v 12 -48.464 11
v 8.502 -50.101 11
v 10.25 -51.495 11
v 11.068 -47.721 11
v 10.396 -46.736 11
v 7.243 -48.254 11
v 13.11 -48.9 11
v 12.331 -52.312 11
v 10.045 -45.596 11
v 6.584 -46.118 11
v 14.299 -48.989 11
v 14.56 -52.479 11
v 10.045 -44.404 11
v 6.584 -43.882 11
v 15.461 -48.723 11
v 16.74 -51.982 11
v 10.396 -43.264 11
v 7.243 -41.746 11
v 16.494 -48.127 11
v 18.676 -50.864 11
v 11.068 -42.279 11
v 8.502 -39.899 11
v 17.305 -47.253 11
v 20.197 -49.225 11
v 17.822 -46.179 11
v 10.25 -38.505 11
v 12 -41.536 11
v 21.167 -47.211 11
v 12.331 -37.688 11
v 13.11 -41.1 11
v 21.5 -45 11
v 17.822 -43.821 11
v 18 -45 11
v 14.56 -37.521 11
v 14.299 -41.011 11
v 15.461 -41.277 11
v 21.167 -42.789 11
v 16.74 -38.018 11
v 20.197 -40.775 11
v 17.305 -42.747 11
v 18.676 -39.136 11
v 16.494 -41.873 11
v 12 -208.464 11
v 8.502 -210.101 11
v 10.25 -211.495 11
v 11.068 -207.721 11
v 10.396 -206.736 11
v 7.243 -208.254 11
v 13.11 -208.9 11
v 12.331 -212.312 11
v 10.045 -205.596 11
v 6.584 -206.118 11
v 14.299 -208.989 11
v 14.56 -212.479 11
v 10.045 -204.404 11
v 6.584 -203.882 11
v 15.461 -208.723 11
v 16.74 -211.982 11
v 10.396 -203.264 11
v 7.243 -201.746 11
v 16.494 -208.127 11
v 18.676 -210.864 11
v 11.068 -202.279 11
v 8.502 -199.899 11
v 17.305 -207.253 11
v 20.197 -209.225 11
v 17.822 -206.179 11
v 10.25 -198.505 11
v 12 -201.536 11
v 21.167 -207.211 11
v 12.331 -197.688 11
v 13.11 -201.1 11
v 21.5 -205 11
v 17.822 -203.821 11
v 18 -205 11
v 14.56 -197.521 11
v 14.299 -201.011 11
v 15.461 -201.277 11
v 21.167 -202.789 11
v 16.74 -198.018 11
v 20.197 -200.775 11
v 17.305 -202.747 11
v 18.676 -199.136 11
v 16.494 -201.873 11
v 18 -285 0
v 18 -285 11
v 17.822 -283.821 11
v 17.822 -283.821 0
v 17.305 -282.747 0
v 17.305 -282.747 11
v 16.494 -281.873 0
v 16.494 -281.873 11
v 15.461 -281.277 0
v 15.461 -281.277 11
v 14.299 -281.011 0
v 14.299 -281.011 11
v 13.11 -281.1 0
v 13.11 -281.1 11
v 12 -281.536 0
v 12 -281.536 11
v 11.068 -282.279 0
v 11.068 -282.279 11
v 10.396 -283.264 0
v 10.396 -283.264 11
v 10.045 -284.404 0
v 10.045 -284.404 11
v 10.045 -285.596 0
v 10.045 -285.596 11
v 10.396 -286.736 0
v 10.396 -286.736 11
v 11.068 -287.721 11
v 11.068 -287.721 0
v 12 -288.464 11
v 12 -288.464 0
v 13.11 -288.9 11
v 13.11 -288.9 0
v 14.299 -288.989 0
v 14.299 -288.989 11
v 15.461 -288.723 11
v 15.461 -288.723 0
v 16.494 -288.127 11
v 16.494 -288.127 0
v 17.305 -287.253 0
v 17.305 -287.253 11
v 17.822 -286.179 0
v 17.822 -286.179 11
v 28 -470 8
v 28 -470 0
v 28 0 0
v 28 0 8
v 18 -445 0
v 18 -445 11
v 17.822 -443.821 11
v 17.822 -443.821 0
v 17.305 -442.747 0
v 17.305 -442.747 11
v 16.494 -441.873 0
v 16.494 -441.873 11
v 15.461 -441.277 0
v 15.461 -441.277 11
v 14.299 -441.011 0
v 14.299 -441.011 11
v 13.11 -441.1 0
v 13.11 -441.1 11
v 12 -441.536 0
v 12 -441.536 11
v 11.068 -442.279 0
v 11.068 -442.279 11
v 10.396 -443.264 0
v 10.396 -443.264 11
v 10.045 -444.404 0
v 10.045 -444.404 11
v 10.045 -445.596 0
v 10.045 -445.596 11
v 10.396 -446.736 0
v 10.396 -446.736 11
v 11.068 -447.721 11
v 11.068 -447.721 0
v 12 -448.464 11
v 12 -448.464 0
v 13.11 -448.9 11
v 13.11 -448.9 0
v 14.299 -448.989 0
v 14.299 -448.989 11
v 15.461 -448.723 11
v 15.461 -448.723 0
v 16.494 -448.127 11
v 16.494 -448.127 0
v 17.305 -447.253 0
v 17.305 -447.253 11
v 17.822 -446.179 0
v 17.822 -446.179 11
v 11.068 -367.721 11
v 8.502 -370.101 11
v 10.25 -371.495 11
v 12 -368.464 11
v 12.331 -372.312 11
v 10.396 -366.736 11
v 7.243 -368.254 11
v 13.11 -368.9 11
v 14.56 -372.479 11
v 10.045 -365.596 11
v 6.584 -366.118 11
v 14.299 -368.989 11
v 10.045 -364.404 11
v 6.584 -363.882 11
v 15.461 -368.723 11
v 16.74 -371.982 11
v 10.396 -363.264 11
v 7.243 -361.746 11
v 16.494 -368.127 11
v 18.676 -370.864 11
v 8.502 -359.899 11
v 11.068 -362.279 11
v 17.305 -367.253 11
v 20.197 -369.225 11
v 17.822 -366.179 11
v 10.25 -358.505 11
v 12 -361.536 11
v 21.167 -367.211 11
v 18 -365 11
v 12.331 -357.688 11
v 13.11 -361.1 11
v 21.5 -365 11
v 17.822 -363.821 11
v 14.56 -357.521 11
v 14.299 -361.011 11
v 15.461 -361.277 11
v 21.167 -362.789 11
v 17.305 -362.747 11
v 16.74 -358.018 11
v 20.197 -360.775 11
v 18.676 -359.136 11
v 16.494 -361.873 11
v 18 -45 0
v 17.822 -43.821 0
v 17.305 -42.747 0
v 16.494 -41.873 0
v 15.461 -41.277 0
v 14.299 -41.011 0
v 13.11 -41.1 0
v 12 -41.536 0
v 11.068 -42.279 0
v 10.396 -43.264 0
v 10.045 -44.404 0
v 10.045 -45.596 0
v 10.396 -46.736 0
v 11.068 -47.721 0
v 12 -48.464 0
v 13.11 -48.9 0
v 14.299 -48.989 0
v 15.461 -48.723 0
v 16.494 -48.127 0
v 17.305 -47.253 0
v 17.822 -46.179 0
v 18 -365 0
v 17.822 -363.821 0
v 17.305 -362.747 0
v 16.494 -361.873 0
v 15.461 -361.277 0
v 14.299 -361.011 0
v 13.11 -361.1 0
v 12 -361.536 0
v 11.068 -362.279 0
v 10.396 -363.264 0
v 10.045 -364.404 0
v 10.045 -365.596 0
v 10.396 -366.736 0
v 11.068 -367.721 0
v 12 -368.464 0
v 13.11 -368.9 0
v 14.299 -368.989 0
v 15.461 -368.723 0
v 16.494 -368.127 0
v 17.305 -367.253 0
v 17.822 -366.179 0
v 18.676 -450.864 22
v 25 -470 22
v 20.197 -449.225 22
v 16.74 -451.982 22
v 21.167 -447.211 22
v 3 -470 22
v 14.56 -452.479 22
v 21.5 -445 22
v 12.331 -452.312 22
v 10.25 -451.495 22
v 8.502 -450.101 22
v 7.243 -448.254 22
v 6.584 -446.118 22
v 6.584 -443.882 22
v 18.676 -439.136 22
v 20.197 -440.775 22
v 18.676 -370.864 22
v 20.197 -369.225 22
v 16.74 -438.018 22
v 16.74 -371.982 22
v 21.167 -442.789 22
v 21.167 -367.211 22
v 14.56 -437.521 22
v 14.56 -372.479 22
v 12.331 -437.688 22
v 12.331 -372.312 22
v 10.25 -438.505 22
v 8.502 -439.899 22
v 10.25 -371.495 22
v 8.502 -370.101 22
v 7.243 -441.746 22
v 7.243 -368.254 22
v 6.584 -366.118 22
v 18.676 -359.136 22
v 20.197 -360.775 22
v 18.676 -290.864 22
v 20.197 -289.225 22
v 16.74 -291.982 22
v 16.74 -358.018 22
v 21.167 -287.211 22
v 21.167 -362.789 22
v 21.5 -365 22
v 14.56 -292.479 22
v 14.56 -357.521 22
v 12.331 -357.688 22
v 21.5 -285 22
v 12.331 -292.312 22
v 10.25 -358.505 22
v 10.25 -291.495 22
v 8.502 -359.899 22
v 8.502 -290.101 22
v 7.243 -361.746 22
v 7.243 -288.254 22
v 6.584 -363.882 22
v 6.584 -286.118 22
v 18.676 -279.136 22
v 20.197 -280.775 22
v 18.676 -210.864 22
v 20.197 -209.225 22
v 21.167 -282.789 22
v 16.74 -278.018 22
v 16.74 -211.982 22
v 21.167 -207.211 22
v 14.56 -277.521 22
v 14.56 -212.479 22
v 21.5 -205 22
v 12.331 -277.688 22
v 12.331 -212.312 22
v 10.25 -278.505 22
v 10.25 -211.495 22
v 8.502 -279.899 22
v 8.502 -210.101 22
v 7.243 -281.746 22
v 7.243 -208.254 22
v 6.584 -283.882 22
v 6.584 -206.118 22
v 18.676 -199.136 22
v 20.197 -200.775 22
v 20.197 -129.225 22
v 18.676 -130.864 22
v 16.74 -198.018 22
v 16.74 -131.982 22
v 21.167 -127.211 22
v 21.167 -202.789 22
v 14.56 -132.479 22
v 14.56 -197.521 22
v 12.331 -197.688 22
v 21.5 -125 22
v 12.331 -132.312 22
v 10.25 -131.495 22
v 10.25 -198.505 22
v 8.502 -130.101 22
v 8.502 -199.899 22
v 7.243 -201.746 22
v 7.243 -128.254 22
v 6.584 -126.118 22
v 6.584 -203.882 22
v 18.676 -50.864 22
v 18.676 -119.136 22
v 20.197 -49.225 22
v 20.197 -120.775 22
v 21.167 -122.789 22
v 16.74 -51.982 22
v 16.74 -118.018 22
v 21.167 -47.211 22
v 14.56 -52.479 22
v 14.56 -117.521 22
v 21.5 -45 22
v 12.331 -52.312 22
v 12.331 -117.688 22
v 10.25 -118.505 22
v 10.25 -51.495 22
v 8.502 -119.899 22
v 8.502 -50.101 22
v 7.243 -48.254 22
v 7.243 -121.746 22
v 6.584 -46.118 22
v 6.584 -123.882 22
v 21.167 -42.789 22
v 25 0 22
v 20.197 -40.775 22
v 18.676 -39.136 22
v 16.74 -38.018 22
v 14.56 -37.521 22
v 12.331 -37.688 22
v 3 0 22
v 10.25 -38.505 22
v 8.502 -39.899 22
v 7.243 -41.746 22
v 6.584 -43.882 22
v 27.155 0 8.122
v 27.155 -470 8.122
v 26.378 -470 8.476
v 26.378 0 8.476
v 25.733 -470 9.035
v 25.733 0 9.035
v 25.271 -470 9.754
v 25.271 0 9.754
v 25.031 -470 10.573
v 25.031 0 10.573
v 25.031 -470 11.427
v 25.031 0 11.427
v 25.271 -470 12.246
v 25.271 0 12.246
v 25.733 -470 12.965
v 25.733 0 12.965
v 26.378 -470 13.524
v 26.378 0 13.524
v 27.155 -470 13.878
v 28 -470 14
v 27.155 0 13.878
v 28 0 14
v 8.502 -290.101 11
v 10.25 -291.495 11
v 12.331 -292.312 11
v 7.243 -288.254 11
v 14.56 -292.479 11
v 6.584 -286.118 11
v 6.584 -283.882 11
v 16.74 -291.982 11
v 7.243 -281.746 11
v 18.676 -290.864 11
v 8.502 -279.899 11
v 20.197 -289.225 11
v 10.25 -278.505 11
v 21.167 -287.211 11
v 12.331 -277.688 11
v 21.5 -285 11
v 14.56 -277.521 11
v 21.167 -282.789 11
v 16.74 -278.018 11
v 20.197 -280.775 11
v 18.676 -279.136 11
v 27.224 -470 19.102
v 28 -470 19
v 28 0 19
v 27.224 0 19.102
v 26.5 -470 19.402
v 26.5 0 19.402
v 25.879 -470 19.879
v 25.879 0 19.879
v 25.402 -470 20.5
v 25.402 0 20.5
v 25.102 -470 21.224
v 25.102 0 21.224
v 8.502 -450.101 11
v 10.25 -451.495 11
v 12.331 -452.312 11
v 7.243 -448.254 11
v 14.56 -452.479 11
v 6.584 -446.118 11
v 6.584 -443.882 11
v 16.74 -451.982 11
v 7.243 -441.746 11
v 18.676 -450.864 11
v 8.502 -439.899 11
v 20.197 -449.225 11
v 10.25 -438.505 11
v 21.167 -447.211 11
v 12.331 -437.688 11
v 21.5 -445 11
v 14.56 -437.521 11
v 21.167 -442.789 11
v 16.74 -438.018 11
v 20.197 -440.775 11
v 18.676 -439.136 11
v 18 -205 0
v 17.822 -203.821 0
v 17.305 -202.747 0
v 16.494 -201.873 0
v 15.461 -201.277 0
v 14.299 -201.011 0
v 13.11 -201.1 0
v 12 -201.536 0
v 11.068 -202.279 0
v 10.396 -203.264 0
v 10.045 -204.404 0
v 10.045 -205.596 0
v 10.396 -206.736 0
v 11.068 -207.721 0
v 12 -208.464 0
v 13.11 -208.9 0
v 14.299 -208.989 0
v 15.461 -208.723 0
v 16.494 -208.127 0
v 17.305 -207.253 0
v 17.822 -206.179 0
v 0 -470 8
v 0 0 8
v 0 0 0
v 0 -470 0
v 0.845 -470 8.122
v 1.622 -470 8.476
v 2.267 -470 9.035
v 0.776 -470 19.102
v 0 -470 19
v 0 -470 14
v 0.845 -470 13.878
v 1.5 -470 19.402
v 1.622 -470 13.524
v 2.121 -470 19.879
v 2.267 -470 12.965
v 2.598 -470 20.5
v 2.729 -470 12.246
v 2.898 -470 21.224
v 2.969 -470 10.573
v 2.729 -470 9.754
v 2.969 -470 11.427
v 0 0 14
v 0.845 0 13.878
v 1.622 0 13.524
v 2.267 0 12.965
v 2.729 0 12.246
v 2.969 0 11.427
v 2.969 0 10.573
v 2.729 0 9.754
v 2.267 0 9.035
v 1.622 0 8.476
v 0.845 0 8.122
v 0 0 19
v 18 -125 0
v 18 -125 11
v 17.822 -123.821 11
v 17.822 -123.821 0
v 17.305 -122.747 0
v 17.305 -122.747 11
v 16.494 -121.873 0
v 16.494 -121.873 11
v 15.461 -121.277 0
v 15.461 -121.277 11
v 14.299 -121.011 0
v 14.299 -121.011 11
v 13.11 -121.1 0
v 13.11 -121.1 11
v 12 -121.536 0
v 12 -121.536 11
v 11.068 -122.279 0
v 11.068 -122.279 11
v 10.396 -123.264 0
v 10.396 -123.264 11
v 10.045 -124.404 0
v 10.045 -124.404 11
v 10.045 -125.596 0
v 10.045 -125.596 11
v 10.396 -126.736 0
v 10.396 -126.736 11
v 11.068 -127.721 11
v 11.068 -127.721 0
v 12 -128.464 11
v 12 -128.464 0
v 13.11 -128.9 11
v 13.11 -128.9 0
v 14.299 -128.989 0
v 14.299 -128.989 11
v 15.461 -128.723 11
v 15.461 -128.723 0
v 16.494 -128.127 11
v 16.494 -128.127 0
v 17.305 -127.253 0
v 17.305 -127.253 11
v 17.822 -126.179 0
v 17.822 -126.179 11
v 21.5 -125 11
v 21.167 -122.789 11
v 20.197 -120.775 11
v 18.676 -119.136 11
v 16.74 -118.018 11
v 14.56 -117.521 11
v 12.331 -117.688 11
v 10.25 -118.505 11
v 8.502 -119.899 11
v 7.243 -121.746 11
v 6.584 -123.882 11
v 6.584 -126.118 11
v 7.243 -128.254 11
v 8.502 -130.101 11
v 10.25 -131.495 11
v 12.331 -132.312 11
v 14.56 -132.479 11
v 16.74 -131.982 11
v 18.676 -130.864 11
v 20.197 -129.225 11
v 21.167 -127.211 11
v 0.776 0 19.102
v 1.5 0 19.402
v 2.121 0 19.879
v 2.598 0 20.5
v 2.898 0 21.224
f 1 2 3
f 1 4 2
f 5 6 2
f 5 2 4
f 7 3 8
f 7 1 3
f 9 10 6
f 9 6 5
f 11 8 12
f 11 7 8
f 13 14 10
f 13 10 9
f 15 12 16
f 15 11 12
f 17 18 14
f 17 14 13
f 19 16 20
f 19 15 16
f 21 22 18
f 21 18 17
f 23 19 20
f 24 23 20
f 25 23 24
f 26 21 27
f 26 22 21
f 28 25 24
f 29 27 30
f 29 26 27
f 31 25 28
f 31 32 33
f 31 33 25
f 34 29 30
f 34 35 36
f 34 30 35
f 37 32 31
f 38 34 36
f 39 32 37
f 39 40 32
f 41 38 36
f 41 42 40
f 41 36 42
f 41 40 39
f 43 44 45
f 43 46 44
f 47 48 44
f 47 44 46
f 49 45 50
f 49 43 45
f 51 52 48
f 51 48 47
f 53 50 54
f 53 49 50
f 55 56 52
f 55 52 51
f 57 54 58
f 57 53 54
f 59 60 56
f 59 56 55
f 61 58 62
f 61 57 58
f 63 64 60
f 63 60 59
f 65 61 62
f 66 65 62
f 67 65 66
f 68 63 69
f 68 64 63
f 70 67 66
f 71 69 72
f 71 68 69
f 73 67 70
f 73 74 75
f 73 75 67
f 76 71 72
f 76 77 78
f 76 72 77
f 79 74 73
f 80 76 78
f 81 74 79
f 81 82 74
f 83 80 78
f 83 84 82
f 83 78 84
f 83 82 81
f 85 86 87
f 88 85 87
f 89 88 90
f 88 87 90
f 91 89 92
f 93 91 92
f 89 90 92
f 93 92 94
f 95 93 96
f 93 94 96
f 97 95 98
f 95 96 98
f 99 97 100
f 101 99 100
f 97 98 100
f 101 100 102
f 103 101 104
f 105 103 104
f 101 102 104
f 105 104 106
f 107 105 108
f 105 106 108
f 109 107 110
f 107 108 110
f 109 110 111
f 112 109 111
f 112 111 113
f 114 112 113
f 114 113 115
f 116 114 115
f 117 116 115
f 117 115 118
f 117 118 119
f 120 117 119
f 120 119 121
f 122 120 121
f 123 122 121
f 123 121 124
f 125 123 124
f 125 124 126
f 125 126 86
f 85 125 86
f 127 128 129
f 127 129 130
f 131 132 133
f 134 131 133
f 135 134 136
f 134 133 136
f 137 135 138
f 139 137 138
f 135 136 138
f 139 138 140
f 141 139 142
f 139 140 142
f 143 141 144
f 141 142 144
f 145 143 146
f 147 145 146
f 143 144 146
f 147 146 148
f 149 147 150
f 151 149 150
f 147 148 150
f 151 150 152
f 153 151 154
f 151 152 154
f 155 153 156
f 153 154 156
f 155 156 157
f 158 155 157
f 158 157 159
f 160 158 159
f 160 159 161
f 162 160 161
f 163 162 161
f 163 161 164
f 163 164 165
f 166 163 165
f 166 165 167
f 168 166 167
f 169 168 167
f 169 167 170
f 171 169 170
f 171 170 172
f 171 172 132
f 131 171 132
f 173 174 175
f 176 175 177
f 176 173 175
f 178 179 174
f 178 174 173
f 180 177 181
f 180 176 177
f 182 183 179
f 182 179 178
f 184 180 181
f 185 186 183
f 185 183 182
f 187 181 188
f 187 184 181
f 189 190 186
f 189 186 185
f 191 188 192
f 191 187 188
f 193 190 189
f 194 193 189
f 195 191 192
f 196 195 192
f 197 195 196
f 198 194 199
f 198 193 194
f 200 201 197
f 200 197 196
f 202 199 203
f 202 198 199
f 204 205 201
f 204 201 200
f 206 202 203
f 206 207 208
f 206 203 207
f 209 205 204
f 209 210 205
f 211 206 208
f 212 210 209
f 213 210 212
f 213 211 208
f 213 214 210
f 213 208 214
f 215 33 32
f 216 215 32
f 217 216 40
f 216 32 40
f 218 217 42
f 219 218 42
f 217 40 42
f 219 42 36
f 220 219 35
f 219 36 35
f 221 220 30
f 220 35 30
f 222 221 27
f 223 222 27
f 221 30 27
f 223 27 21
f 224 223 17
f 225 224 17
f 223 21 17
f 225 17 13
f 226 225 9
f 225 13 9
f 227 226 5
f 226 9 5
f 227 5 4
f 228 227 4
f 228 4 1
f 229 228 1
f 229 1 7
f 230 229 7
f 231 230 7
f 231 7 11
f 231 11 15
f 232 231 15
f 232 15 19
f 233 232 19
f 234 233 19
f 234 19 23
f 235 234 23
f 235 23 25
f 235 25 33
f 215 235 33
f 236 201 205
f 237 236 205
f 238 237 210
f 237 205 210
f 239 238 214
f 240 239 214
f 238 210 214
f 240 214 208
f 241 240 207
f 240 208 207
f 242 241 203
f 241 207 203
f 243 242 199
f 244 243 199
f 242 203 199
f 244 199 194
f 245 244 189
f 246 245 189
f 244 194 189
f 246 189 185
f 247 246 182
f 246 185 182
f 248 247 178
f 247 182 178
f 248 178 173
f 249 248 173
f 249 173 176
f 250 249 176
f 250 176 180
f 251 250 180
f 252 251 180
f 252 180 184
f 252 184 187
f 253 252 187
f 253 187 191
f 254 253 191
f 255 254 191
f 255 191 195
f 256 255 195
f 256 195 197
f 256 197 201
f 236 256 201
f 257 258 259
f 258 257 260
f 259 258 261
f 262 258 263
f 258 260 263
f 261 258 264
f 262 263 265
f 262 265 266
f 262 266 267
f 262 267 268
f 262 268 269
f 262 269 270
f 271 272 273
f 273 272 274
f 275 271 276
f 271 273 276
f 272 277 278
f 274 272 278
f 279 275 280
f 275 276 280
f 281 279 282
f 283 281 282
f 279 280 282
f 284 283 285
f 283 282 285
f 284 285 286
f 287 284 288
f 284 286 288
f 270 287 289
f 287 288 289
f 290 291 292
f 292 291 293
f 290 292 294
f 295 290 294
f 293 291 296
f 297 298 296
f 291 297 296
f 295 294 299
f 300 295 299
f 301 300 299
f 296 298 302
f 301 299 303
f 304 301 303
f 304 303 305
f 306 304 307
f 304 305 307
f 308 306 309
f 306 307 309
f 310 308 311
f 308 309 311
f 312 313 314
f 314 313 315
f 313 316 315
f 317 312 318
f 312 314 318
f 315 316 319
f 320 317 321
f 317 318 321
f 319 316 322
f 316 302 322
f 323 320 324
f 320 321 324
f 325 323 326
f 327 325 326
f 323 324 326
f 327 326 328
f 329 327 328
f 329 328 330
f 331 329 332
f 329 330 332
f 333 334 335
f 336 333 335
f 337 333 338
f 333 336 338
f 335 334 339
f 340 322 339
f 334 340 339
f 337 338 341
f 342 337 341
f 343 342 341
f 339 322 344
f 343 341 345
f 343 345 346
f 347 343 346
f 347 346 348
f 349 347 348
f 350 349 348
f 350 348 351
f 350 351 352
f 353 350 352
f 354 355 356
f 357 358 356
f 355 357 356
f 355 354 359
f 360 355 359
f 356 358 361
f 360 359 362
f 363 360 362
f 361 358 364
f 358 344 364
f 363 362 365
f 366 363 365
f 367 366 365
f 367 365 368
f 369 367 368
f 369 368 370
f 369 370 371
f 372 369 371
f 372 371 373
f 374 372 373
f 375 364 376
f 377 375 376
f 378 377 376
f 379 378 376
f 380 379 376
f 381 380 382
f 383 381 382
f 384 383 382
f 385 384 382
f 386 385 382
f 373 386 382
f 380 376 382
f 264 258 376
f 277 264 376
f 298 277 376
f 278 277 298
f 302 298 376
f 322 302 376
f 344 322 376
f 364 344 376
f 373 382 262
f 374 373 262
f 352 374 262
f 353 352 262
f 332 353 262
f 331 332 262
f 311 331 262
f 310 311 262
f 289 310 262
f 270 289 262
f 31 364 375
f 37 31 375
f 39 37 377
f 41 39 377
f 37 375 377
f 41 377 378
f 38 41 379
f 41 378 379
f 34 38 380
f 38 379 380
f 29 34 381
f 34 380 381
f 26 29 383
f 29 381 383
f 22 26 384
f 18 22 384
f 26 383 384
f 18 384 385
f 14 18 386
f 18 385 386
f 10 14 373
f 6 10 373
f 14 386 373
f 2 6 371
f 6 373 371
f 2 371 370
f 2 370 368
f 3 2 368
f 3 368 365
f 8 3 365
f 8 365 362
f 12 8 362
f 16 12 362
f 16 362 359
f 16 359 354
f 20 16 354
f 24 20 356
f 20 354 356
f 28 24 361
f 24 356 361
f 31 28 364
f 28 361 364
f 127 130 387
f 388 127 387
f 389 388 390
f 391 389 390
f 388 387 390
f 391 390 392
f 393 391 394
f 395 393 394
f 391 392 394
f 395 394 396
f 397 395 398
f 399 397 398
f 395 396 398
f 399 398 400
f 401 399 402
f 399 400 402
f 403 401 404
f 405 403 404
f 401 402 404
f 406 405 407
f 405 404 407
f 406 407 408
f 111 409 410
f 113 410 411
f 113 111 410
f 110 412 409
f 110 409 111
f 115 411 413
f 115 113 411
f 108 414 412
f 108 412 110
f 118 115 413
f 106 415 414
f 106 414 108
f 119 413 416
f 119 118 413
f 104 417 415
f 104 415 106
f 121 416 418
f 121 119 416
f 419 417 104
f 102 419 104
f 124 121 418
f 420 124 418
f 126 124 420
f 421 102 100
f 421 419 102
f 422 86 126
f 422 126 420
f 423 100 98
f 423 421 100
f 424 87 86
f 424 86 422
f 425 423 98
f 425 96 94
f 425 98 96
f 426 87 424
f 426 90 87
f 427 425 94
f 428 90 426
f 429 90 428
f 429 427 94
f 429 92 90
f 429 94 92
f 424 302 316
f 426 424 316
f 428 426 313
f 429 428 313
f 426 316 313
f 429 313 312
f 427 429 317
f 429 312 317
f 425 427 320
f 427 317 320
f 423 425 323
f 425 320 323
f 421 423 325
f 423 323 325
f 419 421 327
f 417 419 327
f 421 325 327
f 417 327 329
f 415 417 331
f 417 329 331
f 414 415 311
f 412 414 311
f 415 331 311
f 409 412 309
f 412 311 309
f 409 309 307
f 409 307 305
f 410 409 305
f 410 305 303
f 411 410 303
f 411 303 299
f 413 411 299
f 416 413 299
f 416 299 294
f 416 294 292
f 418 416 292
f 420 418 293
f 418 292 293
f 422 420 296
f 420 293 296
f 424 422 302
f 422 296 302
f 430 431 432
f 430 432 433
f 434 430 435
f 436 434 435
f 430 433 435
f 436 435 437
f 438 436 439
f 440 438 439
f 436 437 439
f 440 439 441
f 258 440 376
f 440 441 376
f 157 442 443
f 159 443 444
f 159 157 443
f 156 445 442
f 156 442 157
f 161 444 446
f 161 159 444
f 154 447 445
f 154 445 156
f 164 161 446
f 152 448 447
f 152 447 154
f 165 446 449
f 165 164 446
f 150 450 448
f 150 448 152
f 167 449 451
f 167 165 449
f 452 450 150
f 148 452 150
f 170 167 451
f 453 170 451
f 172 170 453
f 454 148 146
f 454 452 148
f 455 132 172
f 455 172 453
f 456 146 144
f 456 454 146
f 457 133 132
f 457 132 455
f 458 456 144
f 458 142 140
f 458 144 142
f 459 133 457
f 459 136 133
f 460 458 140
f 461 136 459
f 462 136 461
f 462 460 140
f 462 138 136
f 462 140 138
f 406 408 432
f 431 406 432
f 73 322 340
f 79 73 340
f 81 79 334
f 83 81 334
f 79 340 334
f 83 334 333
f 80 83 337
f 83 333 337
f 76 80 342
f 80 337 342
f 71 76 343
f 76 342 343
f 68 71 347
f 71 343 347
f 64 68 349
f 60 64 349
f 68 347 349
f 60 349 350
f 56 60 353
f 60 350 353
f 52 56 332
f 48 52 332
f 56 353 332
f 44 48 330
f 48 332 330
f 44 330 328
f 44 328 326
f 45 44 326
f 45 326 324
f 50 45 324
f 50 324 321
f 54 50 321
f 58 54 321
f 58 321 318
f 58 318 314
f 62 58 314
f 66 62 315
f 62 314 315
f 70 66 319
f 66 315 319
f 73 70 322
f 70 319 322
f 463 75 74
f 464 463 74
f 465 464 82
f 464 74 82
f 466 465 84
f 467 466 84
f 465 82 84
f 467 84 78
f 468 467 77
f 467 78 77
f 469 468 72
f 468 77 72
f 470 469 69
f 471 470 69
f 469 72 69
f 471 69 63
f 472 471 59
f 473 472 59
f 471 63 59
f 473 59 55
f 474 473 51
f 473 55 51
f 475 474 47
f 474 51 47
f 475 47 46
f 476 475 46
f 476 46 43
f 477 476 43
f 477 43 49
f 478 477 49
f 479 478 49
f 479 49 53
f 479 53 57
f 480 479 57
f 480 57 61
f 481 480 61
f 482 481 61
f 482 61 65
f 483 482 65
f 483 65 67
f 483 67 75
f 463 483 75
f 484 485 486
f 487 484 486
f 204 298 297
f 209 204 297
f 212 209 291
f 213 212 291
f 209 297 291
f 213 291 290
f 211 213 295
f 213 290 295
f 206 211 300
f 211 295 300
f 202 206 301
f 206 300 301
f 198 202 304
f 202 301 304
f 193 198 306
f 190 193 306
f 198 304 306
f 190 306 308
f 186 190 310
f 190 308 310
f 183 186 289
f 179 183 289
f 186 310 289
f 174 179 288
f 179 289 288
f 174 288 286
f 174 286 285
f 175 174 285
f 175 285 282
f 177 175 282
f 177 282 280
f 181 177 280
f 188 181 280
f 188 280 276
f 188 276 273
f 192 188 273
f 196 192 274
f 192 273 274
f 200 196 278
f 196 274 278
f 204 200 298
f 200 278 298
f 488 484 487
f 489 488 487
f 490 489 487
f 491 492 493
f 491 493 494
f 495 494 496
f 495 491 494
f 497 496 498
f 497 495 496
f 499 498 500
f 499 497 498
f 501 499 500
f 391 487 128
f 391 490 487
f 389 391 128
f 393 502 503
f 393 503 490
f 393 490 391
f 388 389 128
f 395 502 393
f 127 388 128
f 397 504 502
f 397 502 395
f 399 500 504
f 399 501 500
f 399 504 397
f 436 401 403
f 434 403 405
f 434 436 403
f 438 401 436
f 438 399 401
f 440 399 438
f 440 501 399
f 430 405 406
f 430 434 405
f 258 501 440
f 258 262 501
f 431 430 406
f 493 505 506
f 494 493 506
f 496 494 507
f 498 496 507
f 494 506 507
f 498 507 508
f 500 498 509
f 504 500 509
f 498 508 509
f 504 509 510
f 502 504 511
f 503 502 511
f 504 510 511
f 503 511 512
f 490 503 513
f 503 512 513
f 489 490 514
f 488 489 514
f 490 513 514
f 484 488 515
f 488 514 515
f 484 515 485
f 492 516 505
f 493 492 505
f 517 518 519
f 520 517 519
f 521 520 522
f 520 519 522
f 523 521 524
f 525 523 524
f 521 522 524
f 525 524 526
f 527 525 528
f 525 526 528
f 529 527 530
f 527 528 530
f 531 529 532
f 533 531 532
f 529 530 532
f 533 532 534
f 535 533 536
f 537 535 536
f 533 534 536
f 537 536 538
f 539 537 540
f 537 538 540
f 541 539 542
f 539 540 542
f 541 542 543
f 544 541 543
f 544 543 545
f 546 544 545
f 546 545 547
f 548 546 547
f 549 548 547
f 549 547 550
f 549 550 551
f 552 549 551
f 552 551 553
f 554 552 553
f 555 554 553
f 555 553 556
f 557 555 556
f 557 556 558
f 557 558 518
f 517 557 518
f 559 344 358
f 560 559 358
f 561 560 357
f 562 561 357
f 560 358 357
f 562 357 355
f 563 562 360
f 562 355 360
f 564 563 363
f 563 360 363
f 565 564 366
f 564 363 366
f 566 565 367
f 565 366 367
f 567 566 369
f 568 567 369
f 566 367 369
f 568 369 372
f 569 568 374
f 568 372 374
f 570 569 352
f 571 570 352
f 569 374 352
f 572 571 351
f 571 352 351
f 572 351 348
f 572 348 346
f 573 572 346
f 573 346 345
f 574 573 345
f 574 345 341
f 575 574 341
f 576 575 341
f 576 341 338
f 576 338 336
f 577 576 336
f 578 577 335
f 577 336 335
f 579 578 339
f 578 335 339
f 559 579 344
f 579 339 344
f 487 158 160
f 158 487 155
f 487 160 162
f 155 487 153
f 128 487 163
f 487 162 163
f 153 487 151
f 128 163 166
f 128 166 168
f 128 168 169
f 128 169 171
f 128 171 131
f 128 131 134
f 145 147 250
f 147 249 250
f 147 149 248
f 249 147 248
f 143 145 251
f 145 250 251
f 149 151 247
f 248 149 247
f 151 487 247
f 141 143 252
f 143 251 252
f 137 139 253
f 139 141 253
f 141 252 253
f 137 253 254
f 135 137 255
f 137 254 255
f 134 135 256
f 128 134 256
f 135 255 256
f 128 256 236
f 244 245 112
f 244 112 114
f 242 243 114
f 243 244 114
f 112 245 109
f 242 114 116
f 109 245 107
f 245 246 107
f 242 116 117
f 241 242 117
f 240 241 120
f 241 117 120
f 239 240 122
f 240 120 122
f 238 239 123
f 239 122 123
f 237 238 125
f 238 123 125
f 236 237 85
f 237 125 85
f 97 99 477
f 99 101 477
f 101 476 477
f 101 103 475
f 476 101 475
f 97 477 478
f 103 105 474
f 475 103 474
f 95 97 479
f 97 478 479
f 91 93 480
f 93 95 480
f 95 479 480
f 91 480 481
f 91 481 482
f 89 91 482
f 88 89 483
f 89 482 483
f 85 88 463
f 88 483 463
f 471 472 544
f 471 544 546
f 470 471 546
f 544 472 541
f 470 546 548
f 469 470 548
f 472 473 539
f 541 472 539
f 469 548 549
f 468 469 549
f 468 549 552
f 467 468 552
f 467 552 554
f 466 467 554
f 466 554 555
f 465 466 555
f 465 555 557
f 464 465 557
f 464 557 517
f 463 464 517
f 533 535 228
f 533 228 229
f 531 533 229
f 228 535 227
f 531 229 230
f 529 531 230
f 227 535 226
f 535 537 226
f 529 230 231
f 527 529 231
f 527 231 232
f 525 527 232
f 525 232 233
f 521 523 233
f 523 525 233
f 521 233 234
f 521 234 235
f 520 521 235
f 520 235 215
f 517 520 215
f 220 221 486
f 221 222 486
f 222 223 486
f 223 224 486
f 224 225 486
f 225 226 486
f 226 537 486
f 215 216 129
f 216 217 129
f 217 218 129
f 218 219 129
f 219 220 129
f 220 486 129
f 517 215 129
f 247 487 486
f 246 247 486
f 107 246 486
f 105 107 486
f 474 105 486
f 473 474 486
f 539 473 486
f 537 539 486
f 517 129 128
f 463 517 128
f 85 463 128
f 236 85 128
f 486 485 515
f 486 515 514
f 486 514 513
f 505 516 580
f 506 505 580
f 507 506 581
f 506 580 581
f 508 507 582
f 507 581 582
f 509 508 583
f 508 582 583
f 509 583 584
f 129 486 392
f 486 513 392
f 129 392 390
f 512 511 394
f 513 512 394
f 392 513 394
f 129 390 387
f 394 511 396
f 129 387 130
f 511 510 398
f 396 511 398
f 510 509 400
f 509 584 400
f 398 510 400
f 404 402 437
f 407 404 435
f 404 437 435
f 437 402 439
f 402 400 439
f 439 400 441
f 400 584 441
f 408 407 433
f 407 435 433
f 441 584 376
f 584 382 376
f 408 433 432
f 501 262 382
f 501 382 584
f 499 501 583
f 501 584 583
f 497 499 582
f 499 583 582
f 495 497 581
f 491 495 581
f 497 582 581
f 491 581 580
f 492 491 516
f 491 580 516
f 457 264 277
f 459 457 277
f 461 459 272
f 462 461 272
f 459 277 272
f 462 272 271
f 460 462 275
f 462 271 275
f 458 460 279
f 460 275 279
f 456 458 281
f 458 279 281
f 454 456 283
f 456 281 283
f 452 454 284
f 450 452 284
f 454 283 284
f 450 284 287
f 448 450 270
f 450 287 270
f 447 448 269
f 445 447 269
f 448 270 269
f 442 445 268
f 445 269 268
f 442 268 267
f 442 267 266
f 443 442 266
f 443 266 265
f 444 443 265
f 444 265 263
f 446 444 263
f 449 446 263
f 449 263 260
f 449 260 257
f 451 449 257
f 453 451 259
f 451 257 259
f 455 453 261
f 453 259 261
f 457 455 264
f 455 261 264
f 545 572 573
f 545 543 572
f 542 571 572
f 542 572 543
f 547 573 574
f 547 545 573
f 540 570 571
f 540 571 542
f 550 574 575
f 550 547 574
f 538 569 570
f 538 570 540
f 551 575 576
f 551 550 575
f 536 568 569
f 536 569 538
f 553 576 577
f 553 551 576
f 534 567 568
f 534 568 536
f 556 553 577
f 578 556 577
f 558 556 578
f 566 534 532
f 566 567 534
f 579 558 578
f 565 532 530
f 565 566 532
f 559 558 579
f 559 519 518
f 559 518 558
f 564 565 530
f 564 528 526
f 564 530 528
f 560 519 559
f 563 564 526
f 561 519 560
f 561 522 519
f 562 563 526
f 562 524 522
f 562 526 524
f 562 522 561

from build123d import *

# Parameters (mm, degrees)
F1_DEPTH = 470
F2_R     = 4
F3_DEPTH = 25
F4_R     = 7.5
F5_DEPTH = 11


with BuildPart() as f1:
    # F0 (on Front) → F1 (new body)
    with BuildSketch(Plane.XZ):
        with BuildLine():
            Line((0, 8), (0, 0))
            Line((0, 0), (28, 0))
            Line((28, 0), (28, 8))
            ThreePointArc((28, 8), (25, 11), (28, 14))
            Line((28, 14), (28, 19))
            ThreePointArc((28, 19), (25.87868, 19.87868), (25, 22))
            Line((25, 22), (3, 22))
            ThreePointArc((3, 22), (2.12132, 19.87868), (0, 19))
            Line((0, 19), (0, 14))
            ThreePointArc((0, 14), (3, 11), (0, 8))
        make_face()
    extrude(amount=F1_DEPTH)

    # F2 (on face) → F3 (cut)
    with BuildSketch(Plane.XY.offset(22)):
        with Locations((14, -45)):
            Circle(F2_R)
        with Locations((14, -125)):
            Circle(F2_R)
        with Locations((14, -205)):
            Circle(F2_R)
        with Locations((14, -285)):
            Circle(F2_R)
        with Locations((14, -365)):
            Circle(F2_R)
        with Locations((14, -445)):
            Circle(F2_R)
    extrude(amount=-F3_DEPTH, mode=Mode.SUBTRACT)

    # F4 (on face) → F5 (cut)
    with BuildSketch(Plane.XY.offset(22)):
        with Locations((14, -205)):
            Circle(F4_R)
        with Locations((14, -125)):
            Circle(F4_R)
        with Locations((14, -45)):
            Circle(F4_R)
        with Locations((14, -285)):
            Circle(F4_R)
        with Locations((14, -365)):
            Circle(F4_R)
        with Locations((14, -445)):
            Circle(F4_R)
    extrude(amount=-F5_DEPTH, mode=Mode.SUBTRACT)


solid = f1.part
